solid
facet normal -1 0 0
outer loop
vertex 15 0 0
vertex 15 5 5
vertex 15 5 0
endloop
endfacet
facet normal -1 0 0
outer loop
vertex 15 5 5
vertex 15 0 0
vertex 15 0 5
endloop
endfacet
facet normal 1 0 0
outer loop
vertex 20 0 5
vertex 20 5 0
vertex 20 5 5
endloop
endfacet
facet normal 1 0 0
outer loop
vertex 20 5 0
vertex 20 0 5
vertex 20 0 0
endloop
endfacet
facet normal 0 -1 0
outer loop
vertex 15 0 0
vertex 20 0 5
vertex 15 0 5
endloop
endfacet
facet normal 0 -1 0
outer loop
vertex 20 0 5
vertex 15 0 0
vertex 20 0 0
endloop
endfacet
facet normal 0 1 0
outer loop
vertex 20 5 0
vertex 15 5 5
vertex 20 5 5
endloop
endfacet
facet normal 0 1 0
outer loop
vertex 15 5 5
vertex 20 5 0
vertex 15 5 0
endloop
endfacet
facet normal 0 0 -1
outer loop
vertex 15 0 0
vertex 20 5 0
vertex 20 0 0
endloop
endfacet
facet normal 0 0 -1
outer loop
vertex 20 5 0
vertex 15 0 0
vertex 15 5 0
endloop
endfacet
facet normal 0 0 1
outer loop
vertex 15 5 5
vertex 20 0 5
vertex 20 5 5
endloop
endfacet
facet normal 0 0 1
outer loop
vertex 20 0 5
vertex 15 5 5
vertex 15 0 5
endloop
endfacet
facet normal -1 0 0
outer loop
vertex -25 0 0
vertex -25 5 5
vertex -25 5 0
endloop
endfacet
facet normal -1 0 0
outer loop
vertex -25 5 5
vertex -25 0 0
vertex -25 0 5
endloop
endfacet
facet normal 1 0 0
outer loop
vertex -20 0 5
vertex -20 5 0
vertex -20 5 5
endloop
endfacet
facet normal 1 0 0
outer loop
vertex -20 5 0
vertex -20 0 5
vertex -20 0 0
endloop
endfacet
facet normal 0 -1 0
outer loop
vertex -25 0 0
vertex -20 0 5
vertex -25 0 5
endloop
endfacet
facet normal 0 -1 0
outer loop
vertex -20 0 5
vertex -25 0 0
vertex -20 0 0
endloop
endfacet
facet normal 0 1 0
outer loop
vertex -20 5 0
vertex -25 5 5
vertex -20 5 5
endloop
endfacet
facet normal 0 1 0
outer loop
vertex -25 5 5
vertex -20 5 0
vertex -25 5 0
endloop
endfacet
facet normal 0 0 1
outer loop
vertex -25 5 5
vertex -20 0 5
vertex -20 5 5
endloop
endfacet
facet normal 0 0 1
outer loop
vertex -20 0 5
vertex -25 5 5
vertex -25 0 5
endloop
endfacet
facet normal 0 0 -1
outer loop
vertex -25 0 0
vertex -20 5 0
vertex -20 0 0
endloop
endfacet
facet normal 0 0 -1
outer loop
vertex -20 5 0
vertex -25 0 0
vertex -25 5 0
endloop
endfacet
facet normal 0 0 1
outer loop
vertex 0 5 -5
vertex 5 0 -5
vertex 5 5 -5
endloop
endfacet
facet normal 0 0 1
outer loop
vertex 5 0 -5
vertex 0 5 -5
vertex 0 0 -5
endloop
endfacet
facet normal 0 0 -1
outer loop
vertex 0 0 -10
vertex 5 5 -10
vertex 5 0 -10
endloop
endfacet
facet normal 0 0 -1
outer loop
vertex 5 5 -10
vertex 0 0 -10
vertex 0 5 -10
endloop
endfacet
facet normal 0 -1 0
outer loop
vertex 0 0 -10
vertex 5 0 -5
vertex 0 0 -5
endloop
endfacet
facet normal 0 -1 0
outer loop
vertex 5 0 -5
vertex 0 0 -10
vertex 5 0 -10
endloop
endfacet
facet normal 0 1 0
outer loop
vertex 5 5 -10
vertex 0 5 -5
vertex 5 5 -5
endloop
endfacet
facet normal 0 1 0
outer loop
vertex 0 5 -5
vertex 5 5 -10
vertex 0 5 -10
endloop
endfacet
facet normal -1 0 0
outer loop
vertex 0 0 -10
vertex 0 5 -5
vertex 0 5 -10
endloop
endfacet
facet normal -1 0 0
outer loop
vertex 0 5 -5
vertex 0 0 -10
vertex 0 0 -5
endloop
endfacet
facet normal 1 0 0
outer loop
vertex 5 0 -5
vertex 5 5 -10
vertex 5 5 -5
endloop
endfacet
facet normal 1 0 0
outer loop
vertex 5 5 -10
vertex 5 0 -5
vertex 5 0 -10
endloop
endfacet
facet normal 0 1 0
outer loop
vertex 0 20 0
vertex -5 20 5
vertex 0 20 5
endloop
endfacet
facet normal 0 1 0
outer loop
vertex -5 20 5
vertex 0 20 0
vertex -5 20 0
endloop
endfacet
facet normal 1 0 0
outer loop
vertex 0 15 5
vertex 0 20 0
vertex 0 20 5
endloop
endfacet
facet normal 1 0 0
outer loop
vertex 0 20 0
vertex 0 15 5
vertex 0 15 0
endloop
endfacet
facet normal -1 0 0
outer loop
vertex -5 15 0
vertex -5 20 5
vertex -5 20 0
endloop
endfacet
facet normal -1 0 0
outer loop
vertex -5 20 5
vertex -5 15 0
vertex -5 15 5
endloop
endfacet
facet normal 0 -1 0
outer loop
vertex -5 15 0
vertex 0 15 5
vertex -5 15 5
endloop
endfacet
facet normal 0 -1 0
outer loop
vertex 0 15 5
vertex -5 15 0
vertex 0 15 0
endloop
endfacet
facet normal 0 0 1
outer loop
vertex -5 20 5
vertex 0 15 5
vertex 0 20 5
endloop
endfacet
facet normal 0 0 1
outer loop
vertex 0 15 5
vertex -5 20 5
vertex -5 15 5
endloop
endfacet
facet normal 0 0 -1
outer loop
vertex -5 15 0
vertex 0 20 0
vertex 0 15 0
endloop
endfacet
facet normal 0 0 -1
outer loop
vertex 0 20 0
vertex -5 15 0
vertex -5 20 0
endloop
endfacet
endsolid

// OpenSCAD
rotate([90, 0, 0]) translate([15, 0, -5]) color([1, 0, 0]) cube(5);

rotate([90, 0, 0]) translate([-25, 0, -5]) color([1, 1, 0]) cube(5);

rotate([90, 90, 0]) translate([5, 0, -5]) color([1, 0, 1]) cube(5);

rotate([90, 0, 90]) translate([15, 0, -5]) color([0, 1, 0]) cube(5);
